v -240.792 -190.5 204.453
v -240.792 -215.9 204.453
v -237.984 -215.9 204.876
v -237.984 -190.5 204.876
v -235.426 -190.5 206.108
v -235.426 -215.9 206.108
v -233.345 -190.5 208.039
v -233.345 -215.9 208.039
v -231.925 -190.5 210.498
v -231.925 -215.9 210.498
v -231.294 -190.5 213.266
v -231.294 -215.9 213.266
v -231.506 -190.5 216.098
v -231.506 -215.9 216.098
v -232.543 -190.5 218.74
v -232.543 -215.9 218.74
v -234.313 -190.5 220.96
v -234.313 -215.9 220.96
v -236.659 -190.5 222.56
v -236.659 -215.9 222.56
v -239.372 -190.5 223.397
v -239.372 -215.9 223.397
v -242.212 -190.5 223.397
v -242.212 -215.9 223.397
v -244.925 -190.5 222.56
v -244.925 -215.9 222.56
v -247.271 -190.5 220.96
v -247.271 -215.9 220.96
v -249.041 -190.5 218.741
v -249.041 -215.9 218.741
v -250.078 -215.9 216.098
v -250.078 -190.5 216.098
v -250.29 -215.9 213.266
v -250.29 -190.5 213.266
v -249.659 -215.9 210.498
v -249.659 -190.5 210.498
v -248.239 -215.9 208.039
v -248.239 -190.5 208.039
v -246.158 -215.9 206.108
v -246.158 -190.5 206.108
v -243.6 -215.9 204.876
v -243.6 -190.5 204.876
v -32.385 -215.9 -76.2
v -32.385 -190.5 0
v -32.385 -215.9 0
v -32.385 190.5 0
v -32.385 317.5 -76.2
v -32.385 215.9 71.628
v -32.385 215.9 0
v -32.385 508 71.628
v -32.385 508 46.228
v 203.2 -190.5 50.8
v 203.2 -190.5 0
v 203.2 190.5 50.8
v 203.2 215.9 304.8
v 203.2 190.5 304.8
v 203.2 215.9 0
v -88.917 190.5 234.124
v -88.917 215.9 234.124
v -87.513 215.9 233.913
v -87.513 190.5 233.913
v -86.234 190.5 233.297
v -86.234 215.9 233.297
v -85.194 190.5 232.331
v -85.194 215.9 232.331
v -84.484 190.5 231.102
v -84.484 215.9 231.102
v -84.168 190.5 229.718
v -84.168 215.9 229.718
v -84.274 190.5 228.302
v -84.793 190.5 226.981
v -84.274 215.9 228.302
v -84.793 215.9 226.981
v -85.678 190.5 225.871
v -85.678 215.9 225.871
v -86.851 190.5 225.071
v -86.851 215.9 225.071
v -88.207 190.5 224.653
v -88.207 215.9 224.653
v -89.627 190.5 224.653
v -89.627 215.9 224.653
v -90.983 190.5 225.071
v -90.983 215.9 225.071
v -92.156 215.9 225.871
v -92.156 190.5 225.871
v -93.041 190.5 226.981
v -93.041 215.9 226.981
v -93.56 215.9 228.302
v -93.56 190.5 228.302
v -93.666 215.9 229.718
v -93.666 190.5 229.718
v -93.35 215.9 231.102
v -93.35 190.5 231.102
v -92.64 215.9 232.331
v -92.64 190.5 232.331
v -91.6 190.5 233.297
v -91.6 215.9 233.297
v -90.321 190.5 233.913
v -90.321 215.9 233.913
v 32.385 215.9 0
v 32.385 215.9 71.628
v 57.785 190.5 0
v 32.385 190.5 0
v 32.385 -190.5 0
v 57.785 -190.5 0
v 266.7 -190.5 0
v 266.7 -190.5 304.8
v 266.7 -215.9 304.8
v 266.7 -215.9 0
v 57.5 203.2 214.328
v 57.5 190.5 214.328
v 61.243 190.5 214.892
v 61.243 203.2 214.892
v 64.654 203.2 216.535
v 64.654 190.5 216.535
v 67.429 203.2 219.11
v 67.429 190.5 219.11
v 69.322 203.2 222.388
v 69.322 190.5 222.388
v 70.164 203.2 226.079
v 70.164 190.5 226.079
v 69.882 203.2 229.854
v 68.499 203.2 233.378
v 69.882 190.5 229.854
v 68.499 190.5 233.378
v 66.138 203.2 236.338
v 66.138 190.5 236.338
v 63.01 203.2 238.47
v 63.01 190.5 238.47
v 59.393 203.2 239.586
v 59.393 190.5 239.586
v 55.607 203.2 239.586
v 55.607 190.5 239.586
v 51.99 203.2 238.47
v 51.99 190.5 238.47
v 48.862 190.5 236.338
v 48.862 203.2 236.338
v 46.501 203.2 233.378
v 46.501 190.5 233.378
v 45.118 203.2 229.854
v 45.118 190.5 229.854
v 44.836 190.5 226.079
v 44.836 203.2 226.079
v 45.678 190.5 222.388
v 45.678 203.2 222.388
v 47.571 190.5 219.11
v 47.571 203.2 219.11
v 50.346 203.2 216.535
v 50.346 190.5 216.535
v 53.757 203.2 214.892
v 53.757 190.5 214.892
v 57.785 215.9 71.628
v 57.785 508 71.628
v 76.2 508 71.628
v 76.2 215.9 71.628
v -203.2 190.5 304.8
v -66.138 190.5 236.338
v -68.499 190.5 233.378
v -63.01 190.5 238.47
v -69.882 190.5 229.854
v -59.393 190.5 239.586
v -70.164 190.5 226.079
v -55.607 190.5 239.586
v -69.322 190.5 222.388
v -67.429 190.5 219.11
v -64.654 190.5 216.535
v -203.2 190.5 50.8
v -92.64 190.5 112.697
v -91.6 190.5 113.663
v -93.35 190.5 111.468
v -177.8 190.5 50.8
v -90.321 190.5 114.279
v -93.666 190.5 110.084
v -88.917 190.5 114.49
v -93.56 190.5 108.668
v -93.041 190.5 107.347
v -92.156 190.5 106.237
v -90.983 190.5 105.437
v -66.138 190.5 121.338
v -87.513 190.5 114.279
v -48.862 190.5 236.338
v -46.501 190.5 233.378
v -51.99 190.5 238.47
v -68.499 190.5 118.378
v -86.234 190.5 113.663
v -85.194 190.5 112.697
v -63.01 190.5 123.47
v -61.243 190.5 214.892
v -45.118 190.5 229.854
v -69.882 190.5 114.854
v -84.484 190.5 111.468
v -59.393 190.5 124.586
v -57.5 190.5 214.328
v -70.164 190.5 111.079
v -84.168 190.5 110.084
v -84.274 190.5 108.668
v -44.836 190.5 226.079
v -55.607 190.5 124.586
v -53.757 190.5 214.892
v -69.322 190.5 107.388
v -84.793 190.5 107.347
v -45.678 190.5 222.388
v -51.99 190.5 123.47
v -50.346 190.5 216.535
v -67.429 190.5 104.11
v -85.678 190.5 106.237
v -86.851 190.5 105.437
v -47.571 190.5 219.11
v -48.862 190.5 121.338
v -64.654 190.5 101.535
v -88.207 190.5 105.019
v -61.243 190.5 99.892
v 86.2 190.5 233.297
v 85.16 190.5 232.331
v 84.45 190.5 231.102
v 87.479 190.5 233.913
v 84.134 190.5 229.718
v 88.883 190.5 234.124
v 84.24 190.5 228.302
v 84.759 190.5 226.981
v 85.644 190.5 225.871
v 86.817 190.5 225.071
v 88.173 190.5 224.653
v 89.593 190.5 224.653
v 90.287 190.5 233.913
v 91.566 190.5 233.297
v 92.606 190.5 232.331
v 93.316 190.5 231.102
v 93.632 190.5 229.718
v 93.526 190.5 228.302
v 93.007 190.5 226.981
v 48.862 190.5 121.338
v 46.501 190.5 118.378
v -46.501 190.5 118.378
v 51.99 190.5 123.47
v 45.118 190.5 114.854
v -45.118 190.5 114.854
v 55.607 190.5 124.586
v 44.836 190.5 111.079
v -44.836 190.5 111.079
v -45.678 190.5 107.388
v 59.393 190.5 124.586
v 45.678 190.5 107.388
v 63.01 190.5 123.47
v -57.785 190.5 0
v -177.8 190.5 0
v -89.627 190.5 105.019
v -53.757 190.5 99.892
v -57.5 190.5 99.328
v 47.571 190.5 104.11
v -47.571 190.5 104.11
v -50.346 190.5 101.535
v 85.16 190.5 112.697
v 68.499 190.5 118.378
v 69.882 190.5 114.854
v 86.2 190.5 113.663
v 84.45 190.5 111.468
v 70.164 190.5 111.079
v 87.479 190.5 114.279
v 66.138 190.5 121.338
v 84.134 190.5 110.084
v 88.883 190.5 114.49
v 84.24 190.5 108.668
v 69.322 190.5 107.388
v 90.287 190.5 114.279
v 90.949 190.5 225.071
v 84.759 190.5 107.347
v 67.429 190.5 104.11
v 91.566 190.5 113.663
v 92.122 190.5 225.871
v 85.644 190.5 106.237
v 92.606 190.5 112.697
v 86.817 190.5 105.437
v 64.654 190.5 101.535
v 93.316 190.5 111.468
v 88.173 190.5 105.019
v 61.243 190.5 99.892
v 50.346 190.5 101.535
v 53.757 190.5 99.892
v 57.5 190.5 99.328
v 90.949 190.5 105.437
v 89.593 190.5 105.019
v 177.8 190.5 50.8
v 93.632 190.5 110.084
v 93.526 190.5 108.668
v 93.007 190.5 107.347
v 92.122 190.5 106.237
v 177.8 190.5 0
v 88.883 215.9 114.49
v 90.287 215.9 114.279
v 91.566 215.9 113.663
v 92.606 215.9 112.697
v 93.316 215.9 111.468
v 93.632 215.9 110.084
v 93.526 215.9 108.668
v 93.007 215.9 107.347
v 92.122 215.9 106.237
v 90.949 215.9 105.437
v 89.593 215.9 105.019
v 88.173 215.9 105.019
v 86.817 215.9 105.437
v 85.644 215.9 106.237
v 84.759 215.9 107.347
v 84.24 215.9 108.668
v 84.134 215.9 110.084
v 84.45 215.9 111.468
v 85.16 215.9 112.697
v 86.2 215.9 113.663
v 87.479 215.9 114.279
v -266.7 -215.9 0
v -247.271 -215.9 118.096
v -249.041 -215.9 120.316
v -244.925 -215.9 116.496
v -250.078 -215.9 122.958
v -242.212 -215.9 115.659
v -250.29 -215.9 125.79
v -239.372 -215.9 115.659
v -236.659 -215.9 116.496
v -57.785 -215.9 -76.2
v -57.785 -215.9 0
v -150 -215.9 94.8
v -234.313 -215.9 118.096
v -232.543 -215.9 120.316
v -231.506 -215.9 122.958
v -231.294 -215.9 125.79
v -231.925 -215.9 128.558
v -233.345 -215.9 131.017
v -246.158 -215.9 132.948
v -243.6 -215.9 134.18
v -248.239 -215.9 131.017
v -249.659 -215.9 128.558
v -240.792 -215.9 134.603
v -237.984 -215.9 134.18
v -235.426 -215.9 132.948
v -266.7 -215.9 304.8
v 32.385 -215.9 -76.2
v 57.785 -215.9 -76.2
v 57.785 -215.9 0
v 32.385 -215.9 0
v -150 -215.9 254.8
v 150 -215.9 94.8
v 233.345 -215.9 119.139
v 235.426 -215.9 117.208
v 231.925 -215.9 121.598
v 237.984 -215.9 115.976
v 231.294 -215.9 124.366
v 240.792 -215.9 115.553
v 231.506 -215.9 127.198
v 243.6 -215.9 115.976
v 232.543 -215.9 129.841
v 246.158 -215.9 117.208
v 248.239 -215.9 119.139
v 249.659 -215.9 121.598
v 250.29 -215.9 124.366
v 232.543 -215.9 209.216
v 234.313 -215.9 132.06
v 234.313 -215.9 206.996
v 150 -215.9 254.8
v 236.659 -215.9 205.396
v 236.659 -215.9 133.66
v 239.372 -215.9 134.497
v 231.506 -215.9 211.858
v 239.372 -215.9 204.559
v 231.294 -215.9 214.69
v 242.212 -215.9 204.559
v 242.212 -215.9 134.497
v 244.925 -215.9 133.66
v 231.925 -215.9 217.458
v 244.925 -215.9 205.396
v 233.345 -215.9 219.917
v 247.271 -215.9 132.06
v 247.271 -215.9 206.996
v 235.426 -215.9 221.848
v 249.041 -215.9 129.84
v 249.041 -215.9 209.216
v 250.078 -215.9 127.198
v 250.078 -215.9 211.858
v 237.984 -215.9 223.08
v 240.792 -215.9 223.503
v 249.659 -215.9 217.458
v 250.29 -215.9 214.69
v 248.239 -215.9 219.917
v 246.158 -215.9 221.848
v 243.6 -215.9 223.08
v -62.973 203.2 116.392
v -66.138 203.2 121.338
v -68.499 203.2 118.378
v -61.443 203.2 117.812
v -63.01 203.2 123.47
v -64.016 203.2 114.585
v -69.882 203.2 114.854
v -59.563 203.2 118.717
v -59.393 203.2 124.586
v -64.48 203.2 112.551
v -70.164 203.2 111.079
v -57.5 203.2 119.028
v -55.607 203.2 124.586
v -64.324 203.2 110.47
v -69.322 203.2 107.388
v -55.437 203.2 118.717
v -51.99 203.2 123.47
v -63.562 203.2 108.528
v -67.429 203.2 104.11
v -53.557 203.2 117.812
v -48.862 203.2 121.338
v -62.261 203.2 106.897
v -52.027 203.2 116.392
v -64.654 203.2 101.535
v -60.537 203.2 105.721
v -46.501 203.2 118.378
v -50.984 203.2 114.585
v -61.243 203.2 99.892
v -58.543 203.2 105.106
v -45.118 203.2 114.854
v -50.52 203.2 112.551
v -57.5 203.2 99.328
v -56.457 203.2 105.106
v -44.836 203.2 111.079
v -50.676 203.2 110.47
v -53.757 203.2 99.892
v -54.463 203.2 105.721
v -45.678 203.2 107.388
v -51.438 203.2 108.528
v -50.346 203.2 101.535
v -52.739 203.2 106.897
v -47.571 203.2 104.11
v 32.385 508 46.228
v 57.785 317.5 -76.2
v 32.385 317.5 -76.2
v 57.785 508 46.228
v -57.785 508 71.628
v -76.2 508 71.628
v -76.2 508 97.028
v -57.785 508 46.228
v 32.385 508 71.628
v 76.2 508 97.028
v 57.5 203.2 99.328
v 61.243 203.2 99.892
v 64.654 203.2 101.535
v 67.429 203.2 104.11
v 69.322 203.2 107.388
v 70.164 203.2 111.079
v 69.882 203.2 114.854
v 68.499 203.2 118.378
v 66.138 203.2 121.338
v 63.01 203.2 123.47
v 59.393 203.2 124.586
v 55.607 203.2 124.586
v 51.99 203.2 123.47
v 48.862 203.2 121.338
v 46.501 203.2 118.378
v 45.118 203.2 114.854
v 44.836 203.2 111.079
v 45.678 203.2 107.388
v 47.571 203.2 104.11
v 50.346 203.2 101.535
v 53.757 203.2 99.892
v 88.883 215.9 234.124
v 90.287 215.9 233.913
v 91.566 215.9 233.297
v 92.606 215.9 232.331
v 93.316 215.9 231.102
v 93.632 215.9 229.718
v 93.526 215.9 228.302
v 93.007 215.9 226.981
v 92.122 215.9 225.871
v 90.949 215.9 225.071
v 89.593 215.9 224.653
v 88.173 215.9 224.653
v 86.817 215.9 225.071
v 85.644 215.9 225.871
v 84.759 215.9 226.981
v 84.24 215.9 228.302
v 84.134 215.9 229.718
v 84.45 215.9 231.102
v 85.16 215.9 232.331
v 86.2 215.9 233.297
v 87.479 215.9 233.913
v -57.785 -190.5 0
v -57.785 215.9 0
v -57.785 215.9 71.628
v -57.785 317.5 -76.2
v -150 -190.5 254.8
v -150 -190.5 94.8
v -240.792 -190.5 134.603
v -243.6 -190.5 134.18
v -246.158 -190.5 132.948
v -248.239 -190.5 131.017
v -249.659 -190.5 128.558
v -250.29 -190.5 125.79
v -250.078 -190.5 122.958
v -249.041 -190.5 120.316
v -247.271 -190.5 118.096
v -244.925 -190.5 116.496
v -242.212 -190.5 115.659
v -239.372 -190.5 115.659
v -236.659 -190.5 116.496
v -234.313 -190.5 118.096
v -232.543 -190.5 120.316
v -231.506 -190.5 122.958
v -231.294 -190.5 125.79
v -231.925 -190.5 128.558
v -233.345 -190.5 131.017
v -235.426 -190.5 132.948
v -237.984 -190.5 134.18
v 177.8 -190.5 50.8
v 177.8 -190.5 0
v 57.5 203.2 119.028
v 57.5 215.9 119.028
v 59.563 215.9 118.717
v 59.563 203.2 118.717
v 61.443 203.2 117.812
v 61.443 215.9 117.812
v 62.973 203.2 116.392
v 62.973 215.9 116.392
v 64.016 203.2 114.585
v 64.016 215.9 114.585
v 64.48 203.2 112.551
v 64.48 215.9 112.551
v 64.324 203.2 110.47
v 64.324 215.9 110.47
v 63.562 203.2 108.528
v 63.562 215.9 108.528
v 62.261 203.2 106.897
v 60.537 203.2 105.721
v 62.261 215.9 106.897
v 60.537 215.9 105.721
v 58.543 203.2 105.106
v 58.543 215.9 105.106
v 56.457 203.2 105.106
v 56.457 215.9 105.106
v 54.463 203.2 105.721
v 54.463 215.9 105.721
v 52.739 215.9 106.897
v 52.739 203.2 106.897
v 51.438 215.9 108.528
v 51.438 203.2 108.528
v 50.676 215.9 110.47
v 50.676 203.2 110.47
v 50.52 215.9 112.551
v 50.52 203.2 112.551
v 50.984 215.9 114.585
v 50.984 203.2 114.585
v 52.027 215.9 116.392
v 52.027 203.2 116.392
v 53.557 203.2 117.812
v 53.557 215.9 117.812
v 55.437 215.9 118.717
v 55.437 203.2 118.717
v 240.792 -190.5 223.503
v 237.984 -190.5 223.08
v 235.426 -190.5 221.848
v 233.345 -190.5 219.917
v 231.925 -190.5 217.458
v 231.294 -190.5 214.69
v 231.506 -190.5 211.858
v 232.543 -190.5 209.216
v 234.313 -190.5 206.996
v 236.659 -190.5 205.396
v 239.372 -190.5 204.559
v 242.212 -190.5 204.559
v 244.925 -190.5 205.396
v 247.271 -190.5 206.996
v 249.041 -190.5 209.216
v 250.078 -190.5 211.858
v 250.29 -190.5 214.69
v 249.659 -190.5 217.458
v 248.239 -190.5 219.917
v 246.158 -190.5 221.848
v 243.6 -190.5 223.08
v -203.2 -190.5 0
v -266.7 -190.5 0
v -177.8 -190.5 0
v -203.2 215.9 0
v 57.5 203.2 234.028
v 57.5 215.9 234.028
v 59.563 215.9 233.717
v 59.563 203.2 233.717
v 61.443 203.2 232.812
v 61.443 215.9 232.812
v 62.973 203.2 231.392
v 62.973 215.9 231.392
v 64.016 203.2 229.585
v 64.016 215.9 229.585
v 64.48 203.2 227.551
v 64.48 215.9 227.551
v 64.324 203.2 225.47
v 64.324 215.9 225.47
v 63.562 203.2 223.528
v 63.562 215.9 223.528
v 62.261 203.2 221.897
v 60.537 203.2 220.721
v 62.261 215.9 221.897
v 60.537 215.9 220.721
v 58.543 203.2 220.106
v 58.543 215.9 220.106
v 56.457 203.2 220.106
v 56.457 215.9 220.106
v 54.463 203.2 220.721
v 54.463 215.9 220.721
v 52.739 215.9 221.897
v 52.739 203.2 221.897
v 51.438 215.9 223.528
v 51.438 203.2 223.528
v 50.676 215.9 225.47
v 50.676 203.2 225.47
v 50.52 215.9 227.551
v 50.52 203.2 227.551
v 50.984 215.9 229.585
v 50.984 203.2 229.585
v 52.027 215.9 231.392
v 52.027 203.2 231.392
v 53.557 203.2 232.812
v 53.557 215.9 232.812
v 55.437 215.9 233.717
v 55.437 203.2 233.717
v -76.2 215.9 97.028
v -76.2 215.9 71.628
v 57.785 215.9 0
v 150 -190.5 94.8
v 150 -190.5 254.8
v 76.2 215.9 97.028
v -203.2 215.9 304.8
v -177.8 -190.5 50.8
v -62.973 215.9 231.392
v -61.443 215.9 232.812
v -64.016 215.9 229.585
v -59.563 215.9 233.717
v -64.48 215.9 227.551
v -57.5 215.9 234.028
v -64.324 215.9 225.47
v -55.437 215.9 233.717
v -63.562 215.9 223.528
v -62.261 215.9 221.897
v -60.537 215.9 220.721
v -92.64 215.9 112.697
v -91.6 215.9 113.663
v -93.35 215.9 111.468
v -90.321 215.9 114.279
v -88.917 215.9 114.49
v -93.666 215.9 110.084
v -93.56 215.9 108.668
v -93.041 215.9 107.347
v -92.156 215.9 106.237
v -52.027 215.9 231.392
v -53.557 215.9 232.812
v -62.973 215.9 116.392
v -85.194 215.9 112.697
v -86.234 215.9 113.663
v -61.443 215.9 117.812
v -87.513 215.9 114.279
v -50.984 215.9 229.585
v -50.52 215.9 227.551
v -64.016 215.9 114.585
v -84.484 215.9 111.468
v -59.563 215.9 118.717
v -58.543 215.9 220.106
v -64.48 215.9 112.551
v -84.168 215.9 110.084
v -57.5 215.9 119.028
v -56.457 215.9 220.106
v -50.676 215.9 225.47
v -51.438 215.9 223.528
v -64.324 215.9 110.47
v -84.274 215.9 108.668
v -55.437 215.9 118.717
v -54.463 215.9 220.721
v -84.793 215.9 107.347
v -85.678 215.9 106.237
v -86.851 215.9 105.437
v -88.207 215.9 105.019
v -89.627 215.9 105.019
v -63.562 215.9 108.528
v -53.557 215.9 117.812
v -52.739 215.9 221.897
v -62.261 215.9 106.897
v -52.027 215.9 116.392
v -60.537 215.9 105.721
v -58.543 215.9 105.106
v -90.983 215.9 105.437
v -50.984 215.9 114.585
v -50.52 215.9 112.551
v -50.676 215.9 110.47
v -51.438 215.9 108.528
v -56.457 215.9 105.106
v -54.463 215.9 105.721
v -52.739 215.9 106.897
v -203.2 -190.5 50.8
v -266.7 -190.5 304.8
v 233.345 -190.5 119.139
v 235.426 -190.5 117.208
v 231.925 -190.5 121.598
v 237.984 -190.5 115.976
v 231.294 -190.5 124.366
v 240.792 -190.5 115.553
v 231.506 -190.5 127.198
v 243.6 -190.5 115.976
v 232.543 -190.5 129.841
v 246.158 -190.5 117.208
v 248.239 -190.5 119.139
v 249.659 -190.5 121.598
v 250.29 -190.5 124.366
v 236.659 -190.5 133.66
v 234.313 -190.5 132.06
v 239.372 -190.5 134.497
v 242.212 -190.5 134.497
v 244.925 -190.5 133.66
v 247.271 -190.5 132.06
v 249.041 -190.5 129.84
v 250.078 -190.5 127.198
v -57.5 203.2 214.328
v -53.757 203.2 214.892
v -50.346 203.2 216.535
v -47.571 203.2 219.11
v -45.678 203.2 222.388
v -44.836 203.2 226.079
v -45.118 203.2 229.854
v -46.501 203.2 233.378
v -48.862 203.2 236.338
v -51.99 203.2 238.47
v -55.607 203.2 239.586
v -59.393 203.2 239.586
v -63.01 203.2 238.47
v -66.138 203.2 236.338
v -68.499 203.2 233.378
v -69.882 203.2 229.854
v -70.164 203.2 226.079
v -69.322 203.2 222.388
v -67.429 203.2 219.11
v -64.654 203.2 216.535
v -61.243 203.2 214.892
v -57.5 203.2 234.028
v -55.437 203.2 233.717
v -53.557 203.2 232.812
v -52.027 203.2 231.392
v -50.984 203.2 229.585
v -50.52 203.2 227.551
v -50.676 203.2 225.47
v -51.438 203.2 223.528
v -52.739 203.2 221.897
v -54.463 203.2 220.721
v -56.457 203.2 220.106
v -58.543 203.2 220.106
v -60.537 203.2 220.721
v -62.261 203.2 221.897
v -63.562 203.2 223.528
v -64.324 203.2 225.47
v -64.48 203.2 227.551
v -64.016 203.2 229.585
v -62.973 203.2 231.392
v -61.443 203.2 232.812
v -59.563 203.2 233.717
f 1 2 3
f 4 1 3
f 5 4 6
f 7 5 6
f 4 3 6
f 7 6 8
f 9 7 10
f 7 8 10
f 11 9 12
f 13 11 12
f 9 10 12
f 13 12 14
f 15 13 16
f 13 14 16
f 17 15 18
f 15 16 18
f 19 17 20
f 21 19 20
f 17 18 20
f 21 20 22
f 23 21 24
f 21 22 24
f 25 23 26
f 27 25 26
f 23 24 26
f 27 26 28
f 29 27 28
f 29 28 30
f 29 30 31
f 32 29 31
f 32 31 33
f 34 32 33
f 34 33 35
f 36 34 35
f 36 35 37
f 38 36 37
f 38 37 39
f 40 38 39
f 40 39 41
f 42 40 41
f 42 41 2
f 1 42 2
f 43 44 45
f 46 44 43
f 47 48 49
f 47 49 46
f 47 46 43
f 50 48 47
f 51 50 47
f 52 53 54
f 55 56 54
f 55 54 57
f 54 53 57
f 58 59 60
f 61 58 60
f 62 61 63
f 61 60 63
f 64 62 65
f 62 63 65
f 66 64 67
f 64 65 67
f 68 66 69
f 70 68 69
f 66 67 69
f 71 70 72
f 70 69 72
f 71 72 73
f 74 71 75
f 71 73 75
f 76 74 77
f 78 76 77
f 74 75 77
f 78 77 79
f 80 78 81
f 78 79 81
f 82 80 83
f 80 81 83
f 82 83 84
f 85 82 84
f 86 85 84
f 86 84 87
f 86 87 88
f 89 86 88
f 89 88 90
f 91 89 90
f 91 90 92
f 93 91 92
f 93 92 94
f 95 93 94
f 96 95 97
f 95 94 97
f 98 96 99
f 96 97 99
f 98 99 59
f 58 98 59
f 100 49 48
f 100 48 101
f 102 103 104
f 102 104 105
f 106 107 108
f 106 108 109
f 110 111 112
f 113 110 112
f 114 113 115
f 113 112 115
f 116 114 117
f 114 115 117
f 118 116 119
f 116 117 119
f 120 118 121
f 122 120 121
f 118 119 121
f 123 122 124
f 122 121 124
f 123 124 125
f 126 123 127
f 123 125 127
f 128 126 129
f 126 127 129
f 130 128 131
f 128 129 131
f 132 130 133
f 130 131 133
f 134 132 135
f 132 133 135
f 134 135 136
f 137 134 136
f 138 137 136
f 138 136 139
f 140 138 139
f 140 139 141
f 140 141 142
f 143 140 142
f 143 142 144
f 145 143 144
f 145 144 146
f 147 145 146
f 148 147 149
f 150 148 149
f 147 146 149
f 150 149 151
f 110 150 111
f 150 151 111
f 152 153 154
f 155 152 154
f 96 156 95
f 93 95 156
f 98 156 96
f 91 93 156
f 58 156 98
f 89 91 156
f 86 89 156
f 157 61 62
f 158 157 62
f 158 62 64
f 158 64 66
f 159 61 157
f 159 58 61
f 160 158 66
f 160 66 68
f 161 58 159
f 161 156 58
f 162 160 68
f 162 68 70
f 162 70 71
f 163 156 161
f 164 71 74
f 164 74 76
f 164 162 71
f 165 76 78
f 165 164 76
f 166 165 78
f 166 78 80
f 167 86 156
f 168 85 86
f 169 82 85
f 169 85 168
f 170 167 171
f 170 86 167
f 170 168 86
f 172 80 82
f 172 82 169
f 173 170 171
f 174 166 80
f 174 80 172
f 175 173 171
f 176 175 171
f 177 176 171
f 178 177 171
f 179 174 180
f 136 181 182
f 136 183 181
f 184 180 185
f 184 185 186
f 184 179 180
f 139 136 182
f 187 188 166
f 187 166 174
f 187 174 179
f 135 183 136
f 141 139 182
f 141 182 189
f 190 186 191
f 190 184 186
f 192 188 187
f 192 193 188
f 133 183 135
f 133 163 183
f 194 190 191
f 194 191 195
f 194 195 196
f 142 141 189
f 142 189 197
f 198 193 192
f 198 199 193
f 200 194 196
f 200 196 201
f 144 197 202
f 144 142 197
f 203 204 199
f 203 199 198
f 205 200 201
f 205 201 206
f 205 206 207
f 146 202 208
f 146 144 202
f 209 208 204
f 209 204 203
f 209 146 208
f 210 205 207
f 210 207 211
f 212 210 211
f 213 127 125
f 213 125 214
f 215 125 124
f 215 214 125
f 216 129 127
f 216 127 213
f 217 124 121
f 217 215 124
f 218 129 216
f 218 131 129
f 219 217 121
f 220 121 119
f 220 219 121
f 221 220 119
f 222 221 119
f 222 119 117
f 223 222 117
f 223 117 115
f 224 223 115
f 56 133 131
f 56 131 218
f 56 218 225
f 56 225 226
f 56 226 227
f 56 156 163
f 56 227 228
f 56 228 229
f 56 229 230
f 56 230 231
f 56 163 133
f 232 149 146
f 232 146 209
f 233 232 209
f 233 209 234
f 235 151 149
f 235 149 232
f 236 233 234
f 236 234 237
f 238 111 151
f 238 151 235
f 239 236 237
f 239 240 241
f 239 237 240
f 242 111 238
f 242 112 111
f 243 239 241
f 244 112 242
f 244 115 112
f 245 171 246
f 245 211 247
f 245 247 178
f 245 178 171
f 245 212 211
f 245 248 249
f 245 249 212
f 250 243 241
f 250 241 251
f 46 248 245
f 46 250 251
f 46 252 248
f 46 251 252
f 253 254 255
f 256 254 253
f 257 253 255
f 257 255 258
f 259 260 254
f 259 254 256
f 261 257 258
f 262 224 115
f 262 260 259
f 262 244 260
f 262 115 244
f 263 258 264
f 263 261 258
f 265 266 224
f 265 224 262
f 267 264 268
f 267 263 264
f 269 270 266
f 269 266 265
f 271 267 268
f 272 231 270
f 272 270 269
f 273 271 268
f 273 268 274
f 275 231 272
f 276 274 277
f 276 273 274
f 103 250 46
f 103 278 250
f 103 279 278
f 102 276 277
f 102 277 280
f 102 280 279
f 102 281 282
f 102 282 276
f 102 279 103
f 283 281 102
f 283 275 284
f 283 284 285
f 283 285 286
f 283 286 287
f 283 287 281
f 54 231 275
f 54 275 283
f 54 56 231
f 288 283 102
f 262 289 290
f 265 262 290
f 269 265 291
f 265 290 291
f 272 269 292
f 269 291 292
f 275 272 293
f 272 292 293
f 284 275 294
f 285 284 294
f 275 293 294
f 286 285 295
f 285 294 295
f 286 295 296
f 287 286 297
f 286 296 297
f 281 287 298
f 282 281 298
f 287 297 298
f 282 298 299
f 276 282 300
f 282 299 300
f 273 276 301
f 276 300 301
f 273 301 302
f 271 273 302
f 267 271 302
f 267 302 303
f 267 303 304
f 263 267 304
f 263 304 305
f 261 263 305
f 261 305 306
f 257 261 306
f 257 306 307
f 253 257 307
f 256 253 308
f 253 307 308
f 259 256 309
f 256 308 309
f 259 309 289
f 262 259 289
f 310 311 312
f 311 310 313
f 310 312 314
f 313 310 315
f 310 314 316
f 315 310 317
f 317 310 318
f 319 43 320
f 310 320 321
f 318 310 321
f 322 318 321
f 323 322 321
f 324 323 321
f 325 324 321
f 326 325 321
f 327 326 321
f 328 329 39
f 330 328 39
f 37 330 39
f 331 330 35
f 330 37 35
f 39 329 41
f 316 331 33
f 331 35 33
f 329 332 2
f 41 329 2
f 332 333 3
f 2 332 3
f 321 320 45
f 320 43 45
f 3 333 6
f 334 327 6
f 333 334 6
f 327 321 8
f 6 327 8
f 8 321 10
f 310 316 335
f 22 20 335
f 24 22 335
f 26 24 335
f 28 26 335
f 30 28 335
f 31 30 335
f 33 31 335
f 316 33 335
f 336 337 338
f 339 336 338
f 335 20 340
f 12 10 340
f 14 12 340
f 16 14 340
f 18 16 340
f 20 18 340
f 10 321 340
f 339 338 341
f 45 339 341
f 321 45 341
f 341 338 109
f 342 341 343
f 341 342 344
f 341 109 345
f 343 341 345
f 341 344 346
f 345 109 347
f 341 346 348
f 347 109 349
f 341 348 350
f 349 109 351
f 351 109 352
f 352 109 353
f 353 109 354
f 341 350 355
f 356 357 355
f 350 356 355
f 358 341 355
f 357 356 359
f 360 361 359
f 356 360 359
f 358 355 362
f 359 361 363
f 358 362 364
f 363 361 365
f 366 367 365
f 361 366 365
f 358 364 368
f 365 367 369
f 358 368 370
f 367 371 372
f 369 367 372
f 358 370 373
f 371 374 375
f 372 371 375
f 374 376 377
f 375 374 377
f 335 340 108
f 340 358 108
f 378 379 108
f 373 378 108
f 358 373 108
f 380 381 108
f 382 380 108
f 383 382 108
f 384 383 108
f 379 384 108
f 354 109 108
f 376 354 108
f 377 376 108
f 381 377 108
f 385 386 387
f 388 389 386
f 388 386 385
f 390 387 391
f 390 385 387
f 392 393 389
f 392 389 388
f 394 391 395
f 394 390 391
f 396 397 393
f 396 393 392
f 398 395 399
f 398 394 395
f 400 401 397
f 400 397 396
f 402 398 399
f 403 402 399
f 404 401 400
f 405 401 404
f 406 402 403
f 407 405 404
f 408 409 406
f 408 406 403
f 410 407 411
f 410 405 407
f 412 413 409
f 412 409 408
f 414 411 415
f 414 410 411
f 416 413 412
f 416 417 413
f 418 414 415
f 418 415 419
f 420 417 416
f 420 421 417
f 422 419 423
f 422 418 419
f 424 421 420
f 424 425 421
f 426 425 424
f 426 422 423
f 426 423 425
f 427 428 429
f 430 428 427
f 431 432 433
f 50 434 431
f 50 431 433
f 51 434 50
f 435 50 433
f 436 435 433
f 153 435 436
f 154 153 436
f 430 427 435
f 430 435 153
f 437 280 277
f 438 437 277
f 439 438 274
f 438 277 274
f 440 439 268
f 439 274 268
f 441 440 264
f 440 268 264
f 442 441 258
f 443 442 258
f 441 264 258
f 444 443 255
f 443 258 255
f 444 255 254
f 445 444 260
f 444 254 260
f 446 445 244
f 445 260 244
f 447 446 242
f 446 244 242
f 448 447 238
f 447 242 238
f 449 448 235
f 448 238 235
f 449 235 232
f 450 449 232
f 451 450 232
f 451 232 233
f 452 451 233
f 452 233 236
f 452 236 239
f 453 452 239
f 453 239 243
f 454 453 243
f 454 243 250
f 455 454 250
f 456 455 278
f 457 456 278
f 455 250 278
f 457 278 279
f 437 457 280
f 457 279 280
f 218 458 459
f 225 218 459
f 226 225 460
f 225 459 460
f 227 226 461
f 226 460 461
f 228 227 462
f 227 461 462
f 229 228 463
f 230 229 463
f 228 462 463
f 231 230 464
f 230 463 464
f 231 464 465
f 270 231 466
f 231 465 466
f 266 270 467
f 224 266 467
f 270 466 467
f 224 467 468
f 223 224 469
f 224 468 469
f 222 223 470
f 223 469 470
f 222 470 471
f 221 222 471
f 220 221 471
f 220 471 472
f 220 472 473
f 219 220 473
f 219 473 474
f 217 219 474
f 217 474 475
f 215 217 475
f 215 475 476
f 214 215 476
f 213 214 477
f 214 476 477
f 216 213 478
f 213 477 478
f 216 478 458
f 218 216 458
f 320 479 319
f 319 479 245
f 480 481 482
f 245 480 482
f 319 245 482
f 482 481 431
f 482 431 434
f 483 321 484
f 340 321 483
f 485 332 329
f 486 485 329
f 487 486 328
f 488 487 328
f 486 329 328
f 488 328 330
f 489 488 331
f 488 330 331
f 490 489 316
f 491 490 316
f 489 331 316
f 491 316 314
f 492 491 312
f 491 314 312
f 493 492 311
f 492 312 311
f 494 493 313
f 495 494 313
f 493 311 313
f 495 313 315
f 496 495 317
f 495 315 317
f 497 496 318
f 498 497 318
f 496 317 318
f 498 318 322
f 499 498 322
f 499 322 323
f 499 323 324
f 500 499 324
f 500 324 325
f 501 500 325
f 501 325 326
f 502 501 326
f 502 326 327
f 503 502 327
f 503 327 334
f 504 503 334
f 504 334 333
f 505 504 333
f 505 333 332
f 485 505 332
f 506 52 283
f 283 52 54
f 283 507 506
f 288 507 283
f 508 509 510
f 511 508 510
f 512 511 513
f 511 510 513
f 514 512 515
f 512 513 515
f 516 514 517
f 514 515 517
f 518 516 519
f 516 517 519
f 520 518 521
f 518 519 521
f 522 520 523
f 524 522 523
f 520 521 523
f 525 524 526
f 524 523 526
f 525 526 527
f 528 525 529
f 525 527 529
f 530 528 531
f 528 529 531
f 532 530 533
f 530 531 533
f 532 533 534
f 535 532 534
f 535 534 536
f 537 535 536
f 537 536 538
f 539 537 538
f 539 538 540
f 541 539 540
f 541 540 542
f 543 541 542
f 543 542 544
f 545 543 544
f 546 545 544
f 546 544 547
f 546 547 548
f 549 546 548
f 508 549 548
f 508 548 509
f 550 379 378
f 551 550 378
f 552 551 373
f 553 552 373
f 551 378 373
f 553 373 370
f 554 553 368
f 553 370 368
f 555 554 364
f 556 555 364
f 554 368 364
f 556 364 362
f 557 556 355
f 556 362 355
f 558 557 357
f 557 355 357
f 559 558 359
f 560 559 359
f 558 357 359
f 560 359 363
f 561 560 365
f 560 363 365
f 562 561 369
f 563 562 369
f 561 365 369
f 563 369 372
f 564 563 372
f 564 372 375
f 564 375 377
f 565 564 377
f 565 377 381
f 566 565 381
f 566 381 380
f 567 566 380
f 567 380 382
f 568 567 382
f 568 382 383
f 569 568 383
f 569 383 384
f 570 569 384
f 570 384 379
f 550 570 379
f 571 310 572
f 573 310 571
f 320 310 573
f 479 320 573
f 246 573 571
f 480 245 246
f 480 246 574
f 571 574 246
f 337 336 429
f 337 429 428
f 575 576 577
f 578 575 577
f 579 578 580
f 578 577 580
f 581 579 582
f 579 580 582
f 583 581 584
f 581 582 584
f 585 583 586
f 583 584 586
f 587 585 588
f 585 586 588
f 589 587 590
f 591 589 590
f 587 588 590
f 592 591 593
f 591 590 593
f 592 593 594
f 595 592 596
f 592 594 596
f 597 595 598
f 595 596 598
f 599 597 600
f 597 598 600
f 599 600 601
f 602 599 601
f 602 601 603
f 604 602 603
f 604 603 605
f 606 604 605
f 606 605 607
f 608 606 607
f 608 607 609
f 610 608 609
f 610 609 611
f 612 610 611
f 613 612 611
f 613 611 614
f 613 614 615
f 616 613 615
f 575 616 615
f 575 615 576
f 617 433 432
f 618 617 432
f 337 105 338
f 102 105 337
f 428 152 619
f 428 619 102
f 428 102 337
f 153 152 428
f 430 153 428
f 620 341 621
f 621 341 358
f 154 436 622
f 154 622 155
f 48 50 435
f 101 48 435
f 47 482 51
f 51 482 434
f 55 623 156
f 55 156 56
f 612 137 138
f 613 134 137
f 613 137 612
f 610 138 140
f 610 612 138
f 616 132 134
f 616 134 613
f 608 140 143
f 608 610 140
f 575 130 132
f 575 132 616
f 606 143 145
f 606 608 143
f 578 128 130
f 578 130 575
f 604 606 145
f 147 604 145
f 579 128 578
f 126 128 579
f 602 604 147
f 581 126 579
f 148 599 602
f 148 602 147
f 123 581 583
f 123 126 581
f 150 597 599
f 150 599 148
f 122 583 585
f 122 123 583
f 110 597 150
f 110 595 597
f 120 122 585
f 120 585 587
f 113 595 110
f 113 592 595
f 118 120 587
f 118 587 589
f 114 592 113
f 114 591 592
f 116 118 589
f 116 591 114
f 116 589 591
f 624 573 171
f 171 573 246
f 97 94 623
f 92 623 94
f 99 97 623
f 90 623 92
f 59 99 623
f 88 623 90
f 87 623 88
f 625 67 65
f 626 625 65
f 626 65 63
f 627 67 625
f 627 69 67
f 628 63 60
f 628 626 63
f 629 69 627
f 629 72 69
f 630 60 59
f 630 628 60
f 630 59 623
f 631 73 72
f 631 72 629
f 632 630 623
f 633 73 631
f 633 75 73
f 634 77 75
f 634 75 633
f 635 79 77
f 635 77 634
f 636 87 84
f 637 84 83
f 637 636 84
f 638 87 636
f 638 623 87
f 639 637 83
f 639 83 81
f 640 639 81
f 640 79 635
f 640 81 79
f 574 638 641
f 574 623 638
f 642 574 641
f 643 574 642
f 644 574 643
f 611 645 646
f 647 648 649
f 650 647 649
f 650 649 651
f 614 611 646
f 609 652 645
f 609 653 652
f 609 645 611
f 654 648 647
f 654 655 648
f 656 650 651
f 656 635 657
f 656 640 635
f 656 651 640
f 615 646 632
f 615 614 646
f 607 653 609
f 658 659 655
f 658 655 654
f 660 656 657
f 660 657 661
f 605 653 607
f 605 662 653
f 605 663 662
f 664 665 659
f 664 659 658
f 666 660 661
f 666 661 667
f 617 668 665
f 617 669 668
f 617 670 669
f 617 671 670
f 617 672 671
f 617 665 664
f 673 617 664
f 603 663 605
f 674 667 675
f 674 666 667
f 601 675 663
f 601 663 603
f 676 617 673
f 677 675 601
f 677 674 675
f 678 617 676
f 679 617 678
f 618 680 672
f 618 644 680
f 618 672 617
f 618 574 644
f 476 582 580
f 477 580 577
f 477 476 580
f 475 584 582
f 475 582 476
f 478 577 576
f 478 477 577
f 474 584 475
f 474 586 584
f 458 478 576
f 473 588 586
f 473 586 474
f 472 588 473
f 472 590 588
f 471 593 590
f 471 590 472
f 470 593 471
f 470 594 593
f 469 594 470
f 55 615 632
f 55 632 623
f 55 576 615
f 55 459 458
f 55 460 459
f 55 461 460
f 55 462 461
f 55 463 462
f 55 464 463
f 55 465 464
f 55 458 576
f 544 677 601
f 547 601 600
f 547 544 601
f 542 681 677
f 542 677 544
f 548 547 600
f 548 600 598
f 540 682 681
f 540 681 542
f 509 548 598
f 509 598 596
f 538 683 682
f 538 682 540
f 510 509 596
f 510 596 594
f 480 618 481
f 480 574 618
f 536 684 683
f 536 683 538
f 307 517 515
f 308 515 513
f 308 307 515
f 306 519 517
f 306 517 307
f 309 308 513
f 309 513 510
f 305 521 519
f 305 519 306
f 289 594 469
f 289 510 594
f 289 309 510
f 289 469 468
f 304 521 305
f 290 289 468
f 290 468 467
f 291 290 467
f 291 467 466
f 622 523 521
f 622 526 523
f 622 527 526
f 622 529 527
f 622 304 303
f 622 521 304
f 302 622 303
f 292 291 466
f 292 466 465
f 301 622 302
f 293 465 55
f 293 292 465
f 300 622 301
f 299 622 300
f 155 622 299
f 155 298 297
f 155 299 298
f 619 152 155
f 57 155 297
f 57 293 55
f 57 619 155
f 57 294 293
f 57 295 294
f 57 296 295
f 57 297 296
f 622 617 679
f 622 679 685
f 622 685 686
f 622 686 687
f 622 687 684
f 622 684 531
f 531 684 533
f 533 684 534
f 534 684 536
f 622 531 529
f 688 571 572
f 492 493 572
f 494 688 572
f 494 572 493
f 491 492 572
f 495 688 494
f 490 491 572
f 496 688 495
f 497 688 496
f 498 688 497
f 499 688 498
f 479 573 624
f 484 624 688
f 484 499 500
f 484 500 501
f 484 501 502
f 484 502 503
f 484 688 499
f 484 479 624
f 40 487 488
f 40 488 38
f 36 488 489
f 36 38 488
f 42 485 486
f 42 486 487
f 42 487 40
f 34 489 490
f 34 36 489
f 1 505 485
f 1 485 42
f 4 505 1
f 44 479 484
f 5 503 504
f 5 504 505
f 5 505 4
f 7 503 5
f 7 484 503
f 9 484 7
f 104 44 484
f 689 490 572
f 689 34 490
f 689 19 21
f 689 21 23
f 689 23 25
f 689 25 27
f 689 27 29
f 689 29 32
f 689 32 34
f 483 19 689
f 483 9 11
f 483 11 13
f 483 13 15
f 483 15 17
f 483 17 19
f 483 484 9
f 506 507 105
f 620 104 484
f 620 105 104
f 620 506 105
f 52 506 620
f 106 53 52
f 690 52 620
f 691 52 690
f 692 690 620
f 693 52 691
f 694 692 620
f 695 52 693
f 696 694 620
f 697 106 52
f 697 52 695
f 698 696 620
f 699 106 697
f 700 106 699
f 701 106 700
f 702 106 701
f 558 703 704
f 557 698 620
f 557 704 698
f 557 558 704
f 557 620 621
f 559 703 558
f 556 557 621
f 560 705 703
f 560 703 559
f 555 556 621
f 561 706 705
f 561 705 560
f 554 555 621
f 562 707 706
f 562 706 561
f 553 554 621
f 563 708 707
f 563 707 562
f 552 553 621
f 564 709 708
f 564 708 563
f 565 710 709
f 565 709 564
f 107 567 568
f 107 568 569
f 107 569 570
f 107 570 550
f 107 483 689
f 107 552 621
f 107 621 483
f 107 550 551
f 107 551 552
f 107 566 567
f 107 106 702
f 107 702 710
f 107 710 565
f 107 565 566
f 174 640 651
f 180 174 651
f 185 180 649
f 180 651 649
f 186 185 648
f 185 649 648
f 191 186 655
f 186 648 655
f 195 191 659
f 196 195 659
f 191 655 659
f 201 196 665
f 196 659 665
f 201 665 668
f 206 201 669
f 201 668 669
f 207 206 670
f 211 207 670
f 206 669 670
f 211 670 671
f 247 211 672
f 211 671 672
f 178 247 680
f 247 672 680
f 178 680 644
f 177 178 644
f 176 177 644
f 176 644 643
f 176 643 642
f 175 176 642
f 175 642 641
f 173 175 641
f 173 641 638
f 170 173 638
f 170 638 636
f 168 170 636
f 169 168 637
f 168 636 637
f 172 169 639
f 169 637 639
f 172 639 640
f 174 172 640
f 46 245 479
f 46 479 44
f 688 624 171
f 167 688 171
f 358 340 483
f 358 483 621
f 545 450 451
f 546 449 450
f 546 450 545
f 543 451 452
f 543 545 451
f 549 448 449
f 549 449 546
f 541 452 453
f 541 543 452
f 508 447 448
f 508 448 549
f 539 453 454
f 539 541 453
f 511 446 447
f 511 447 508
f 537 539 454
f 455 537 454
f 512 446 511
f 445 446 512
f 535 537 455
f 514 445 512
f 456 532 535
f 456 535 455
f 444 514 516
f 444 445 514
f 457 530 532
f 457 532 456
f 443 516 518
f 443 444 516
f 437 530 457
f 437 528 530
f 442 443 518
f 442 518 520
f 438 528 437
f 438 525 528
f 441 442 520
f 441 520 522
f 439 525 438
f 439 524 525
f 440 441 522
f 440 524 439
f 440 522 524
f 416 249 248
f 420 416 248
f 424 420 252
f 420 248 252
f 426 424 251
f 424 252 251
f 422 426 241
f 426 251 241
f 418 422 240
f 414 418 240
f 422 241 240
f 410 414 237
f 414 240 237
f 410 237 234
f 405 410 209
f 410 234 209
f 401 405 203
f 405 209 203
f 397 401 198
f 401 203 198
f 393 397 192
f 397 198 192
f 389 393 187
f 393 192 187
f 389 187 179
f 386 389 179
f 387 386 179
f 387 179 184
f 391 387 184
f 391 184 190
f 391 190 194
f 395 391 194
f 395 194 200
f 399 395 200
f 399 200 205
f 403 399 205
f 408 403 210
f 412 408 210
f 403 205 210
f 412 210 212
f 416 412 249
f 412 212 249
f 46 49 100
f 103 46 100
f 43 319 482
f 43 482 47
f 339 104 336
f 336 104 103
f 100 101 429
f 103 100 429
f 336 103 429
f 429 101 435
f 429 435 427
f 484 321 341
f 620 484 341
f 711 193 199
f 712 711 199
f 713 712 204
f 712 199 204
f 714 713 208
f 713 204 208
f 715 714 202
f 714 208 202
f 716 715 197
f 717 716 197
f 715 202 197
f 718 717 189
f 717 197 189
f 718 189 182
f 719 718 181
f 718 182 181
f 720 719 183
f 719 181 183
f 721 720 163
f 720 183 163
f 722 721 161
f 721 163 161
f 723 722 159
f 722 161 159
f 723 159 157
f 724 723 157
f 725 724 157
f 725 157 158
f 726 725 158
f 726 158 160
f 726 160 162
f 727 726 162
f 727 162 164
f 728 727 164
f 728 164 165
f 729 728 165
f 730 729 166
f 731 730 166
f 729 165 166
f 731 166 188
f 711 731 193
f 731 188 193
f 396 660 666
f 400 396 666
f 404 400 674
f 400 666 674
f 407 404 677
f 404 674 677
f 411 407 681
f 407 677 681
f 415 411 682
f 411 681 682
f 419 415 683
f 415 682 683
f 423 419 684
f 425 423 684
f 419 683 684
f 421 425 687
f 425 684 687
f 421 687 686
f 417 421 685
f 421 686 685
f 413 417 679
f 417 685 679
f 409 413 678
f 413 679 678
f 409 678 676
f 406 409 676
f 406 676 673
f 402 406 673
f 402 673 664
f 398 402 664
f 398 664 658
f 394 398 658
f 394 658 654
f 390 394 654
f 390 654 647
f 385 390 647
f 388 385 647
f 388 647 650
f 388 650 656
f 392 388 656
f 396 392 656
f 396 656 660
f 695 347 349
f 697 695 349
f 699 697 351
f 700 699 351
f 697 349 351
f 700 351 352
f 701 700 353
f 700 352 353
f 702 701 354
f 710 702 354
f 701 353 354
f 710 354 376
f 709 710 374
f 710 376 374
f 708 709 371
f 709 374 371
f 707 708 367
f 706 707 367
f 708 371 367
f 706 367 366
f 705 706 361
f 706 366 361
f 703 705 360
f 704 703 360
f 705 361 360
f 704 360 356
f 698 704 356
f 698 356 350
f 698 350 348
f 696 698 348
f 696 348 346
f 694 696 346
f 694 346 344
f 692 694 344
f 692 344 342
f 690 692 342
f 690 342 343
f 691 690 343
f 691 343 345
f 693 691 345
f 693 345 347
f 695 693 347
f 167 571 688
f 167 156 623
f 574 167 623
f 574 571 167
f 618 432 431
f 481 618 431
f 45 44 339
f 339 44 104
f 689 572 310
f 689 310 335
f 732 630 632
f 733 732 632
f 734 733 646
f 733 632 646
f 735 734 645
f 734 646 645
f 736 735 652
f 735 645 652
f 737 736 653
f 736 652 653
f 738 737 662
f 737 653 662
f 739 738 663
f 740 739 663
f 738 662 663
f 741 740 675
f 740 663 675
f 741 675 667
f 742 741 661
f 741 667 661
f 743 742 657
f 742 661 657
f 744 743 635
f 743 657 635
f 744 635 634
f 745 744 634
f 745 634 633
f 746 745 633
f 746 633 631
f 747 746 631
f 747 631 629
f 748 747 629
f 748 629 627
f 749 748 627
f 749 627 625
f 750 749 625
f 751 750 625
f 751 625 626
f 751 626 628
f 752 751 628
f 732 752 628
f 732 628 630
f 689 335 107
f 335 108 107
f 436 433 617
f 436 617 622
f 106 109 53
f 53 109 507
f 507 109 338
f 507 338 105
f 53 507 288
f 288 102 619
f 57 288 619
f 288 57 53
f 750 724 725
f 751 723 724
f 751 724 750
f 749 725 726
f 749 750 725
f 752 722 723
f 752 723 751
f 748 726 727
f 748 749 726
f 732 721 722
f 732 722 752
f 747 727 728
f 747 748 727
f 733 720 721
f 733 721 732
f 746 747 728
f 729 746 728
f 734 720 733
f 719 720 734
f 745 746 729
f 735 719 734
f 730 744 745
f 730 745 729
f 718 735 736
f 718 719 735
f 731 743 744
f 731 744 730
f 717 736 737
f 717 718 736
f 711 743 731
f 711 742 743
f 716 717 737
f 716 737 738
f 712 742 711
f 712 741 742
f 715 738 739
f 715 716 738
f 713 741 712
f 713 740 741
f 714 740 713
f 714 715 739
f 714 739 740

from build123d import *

# Parameters (mm, degrees)
SKETCH1_W           = 406.4
SKETCH1_H           = 431.8
SKETCH1_W_2         = 355.6
SKETCH1_H_2         = 381
BOSS_EXTRUDE1_DEPTH = 304.8
SKETCH2_W           = 254
SKETCH2_H           = 381
CUT_EXTRUDE1_DEPTH  = 552.975370827
BOSS_EXTRUDE2_DEPTH = 101.6
SKETCH4_W           = 25.4
SKETCH4_H           = 76.2
BOSS_EXTRUDE3_DEPTH = 533.4
BOSS_EXTRUDE4_DEPTH = 25.4
BOSS_EXTRUDE5_DEPTH = 25.4
SKETCH7_W           = 152.4
SKETCH7_H           = 25.4
BOSS_EXTRUDE6_DEPTH = 292.1
SKETCH8_R           = 4.7625
SKETCH8_R_2         = 7
CUT_EXTRUDE2_DEPTH  = 25.4
SKETCH9_R           = 12.7
CUT_EXTRUDE3_DEPTH  = 12.7
BOSS_EXTRUDE7_DEPTH = 25.4
SKETCH11_W          = 304.8
SKETCH11_H          = 25.4
BOSS_EXTRUDE8_DEPTH = 63.5
SKETCH12_W          = 304.8
SKETCH12_H          = 25.4
BOSS_EXTRUDE9_DEPTH = 63.5
SKETCH14_R          = 9.525
CUT_EXTRUDE4_DEPTH  = 830.495714275
SKETCH16_W          = 300
SKETCH16_H          = 160
CUT_EXTRUDE5_DEPTH  = 30


with BuildPart() as part:
    # Sketch1 → Boss-Extrude1 (new body)
    with BuildSketch(Plane.XY):
        Rectangle(SKETCH1_W, SKETCH1_H)
        Rectangle(SKETCH1_W_2, SKETCH1_H_2, mode=Mode.SUBTRACT)
    extrude(amount=BOSS_EXTRUDE1_DEPTH)

    # Sketch2 → Cut-Extrude1 (cut, through all)
    with BuildSketch(Plane(origin=(203.2, 0, 0), x_dir=(0, 0, -1), z_dir=(1, 0, 0))):
        with Locations((-177.8, 0)):
            Rectangle(SKETCH2_W, SKETCH2_H)
    extrude(amount=-CUT_EXTRUDE1_DEPTH, mode=Mode.SUBTRACT)

    # Sketch3 → Boss-Extrude2 (add)
    with BuildSketch(Plane(origin=(0, 215.9, 0), x_dir=(1, 0, 0), z_dir=(0, 1, 0))):
        Polygon((-57.785, 0), (-32.385, 0), (-32.385, -71.628), (32.385, -71.628), (32.385, 0), (57.785, 0), (57.785, -97.028), (32.385, -97.028), (-32.385, -97.028), (-57.785, -97.028), align=None)
    extrude(amount=BOSS_EXTRUDE2_DEPTH)

    # Sketch4 → Boss-Extrude3 (add)
    with BuildSketch(Plane.XZ.offset(215.9)):
        with Locations((-45.085, -38.1)):
            Rectangle(SKETCH4_W, SKETCH4_H)
        with Locations((45.085, -38.1)):
            Rectangle(SKETCH4_W, SKETCH4_H)
    extrude(amount=-BOSS_EXTRUDE3_DEPTH)

    # Sketch5 → Boss-Extrude4 (add)
    with BuildSketch(Plane.ZY.offset(57.785)):
        Polygon((-76.2, 317.5), (46.228, 508), (97.028, 508), (97.028, 317.5), align=None)
    extrude(amount=-BOSS_EXTRUDE4_DEPTH)

    # Sketch6 → Boss-Extrude5 (add)
    with BuildSketch(Plane(origin=(57.785, 0, 0), x_dir=(0, 0, -1), z_dir=(1, 0, 0))):
        Polygon((-46.228, 508), (-97.028, 508), (-97.028, 317.5), (76.2, 317.5), align=None)
    extrude(amount=-BOSS_EXTRUDE5_DEPTH)

    # Sketch7 → Boss-Extrude6 (add)
    with BuildSketch(Plane(origin=(0, 508, 0), x_dir=(1, 0, 0), z_dir=(0, 1, 0))):
        with Locations((0, -84.328)):
            Rectangle(SKETCH7_W, SKETCH7_H)
    extrude(amount=-BOSS_EXTRUDE6_DEPTH)

    # Sketch8 → Cut-Extrude2 (cut)
    with BuildSketch(Plane(origin=(0, 215.9, 0), x_dir=(1, 0, 0), z_dir=(0, 1, 0))):
        with Locations(Location((88.883, -229.362, 0), (0, 0, 270))):
            Circle(SKETCH8_R)
        with Locations(Location((57.5, -227.028, 0), (0, 0, 270))):
            Circle(SKETCH8_R_2)
        with Locations(Location((-88.917, -229.362, 0), (0, 0, 270))):
            Circle(SKETCH8_R)
        with Locations(Location((-57.5, -227.028, 0), (0, 0, 270))):
            Circle(SKETCH8_R_2)
        with Locations(Location((-88.917, -109.728, 0), (0, 0, 270))):
            Circle(SKETCH8_R)
        with Locations(Location((57.5, -112.028, 0), (0, 0, 270))):
            Circle(SKETCH8_R_2)
        with Locations(Location((88.883, -109.728, 0), (0, 0, 270))):
            Circle(SKETCH8_R)
        with Locations(Location((-57.5, -112.028, 0), (0, 0, 270))):
            Circle(SKETCH8_R_2)
    extrude(amount=-CUT_EXTRUDE2_DEPTH, mode=Mode.SUBTRACT)

    # Sketch9 → Cut-Extrude3 (cut)
    with BuildSketch(Plane.XZ.offset(-190.5)):
        with Locations(Location((-57.5, 227.028, 0), (0, 0, 270))):
            Circle(SKETCH9_R)
        with Locations(Location((57.5, 227.028, 0), (0, 0, 270))):
            Circle(SKETCH9_R)
        with Locations(Location((57.5, 112.028, 0), (0, 0, 270))):
            Circle(SKETCH9_R)
        with Locations(Location((-57.5, 112.028, 0), (0, 0, 270))):
            Circle(SKETCH9_R)
    extrude(amount=-CUT_EXTRUDE3_DEPTH, mode=Mode.SUBTRACT)

    # Sketch10 → Boss-Extrude7 (add)
    with BuildSketch(Plane(origin=(57.785, 0, 0), x_dir=(0, 0, -1), z_dir=(1, 0, 0))):
        Polygon((-71.628, 317.5), (76.2, 317.5), (-46.228, 508), (-71.628, 508), align=None)
    extrude(amount=-BOSS_EXTRUDE7_DEPTH)

    # Sketch11 → Boss-Extrude8 (add)
    with BuildSketch(Plane(origin=(203.2, 0, 0), x_dir=(0, 0, -1), z_dir=(1, 0, 0))):
        with Locations((-152.4, -203.2)):
            Rectangle(SKETCH11_W, SKETCH11_H)
    extrude(amount=BOSS_EXTRUDE8_DEPTH)

    # Sketch12 → Boss-Extrude9 (add)
    with BuildSketch(Plane.ZY.offset(203.2)):
        with Locations((152.4, -203.2)):
            Rectangle(SKETCH12_W, SKETCH12_H)
    extrude(amount=BOSS_EXTRUDE9_DEPTH)

    # Sketch14 → Cut-Extrude4 (cut, through all)
    with BuildSketch(Plane.XZ.offset(215.9)):
        with Locations(Location((-240.792, 213.978, 0), (0, 0, 270))):
            Circle(SKETCH14_R)
        with Locations(Location((-240.792, 125.078, 0), (0, 0, 90))):
            Circle(SKETCH14_R)
        with Locations(Location((240.792, 213.978, 0), (0, 0, 90))):
            Circle(SKETCH14_R)
        with Locations(Location((240.792, 125.078, 0), (0, 0, 270))):
            Circle(SKETCH14_R)
    extrude(amount=-CUT_EXTRUDE4_DEPTH, mode=Mode.SUBTRACT)

    # Sketch16 → Cut-Extrude5 (cut)
    with BuildSketch(Plane.XZ.offset(215.9)):
        with Locations((0, 174.8)):
            Rectangle(SKETCH16_W, SKETCH16_H)
    extrude(amount=-CUT_EXTRUDE5_DEPTH, mode=Mode.SUBTRACT)


solid = part.part
